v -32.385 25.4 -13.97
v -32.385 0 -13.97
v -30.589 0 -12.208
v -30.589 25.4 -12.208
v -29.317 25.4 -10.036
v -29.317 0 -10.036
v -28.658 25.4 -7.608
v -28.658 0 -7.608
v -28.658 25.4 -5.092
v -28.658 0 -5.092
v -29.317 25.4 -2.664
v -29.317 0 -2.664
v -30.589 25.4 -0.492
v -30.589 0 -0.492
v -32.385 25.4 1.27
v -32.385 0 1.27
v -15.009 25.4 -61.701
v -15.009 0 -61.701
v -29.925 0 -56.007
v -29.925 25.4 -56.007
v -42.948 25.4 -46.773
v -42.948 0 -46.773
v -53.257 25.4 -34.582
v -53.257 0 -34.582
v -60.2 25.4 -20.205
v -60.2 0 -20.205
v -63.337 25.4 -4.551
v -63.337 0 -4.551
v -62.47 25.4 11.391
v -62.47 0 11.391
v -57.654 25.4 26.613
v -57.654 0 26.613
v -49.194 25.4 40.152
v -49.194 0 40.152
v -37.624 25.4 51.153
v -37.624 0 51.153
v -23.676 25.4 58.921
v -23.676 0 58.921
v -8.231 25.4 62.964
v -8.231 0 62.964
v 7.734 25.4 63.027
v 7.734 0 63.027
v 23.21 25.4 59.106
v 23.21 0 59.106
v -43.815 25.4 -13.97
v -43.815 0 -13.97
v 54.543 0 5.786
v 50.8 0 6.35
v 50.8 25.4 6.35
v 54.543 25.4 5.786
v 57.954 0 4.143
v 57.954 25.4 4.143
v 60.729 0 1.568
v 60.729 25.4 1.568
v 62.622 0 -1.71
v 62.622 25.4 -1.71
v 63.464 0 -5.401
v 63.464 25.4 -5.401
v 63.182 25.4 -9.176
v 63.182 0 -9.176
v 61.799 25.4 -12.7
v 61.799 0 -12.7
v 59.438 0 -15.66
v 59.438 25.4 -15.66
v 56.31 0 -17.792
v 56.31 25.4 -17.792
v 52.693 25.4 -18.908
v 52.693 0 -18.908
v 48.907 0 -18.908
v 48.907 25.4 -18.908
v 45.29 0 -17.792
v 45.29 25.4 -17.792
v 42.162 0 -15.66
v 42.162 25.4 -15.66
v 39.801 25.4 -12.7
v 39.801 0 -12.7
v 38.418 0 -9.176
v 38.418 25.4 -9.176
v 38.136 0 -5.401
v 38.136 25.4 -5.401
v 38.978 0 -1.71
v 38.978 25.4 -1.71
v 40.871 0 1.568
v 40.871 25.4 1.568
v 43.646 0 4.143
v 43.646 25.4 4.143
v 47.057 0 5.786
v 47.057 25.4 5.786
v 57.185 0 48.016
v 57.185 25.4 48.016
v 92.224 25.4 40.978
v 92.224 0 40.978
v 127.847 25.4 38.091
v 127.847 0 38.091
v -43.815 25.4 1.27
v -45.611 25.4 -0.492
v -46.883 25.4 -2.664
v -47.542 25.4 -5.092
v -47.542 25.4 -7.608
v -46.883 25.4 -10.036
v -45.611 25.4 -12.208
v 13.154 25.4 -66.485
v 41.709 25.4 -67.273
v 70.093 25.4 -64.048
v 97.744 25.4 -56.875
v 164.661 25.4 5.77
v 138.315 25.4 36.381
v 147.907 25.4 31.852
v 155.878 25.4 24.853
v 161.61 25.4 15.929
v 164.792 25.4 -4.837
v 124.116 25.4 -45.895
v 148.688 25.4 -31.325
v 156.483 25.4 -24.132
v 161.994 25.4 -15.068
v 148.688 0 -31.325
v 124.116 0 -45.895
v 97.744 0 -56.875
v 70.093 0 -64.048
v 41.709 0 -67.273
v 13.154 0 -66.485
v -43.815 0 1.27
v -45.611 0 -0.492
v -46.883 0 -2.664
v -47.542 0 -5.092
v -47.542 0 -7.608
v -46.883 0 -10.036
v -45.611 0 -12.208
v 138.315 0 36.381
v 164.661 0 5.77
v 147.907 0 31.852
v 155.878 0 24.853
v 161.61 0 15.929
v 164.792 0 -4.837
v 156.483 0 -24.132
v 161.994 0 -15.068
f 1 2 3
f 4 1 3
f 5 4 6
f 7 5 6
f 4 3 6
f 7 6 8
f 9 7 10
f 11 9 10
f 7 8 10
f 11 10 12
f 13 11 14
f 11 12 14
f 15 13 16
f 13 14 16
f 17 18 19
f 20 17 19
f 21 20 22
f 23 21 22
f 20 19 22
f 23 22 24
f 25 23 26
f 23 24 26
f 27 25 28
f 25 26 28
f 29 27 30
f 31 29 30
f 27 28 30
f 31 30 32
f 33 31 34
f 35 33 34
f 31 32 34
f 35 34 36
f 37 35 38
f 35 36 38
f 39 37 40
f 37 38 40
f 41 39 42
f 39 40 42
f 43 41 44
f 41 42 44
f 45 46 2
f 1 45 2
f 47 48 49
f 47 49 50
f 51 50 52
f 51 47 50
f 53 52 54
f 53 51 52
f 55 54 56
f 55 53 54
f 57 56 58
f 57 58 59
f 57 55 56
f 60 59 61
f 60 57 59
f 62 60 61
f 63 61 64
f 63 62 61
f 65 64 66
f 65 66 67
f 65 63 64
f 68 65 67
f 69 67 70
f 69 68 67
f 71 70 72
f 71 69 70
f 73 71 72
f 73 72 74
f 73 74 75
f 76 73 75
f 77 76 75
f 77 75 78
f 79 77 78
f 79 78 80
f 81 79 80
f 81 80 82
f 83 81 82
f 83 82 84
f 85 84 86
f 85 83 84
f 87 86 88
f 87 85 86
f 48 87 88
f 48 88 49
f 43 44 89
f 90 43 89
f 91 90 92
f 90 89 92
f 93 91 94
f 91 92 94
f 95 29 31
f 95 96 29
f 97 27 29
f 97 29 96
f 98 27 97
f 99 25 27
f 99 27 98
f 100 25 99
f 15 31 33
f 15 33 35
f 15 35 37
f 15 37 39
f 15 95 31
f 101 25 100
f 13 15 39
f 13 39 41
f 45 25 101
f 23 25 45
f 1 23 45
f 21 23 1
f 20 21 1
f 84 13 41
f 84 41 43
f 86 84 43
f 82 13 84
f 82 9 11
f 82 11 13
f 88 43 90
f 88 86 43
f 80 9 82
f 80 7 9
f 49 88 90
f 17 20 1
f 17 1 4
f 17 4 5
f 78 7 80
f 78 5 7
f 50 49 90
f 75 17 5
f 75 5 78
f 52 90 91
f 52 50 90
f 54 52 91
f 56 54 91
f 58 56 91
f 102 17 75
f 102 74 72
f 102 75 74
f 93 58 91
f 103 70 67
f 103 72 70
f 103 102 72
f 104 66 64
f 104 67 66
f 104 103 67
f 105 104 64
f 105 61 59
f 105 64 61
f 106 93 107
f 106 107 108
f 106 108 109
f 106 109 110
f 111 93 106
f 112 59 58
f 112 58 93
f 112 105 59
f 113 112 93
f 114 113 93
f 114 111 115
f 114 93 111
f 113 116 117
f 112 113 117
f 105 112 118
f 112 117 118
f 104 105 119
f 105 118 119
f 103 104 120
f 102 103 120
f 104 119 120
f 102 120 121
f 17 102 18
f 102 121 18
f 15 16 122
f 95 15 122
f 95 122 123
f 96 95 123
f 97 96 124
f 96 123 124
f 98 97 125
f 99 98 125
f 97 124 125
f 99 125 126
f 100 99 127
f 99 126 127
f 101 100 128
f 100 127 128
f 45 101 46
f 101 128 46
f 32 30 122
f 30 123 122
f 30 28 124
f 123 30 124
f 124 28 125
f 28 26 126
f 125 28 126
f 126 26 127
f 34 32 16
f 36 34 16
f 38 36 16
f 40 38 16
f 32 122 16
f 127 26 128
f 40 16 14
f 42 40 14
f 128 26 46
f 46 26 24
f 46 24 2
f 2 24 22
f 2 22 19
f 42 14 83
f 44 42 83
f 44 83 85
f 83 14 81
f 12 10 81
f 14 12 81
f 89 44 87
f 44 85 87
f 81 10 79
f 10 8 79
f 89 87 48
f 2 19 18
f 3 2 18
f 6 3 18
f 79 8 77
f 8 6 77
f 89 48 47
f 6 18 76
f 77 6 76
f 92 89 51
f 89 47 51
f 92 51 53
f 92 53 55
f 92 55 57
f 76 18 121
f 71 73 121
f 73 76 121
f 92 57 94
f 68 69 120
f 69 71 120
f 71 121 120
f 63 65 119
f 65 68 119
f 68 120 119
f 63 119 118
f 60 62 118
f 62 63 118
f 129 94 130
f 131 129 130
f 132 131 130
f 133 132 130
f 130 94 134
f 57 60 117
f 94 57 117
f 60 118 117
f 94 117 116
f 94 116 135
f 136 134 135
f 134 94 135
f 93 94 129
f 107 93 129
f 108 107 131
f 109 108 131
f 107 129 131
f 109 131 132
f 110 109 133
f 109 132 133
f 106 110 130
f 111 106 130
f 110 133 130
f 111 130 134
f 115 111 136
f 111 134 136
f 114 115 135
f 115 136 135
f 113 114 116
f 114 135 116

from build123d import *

# Parameters (mm, degrees)
SKETCH1_R      = 12.7
EXTRUDE1_DEPTH = 25.4


with BuildPart() as part:
    # Sketch1 → Extrude1 (new body)
    with BuildSketch(Plane(origin=(0, 0, 0), x_dir=(1, 0, 0), z_dir=(0, 1, 0))):
        with BuildLine():
            ThreePointArc((-15.009090909, 61.700706561), (-60.542428713, -19.15370266), (23.210344828, -59.106090151))
            ThreePointArc((23.210344828, -59.106090151), (74.601523764, -43.982890719), (127.846666667, -38.090591431))
            ThreePointArc((127.846666667, -38.090591431), (163.49081416, -10.955842364), (148.687692308, 31.3249741))
            ThreePointArc((148.687692308, 31.3249741), (70.093122075, 64.047893785), (-15.009090909, 61.700706561))
        make_face()
        with Locations(Location((50.8, 6.35, 0), (0, 0, 270))):
            Circle(SKETCH1_R, mode=Mode.SUBTRACT)
        with BuildLine():
            Line((-43.815, 13.97), (-32.385, 13.97))
            ThreePointArc((-32.385, 13.97), (-28.575, 6.35), (-32.385, -1.27))
            Line((-32.385, -1.27), (-43.815, -1.27))
            ThreePointArc((-43.815, -1.27), (-47.625, 6.35), (-43.815, 13.97))
        make_face(mode=Mode.SUBTRACT)
    extrude(amount=EXTRUDE1_DEPTH)


solid = part.part
